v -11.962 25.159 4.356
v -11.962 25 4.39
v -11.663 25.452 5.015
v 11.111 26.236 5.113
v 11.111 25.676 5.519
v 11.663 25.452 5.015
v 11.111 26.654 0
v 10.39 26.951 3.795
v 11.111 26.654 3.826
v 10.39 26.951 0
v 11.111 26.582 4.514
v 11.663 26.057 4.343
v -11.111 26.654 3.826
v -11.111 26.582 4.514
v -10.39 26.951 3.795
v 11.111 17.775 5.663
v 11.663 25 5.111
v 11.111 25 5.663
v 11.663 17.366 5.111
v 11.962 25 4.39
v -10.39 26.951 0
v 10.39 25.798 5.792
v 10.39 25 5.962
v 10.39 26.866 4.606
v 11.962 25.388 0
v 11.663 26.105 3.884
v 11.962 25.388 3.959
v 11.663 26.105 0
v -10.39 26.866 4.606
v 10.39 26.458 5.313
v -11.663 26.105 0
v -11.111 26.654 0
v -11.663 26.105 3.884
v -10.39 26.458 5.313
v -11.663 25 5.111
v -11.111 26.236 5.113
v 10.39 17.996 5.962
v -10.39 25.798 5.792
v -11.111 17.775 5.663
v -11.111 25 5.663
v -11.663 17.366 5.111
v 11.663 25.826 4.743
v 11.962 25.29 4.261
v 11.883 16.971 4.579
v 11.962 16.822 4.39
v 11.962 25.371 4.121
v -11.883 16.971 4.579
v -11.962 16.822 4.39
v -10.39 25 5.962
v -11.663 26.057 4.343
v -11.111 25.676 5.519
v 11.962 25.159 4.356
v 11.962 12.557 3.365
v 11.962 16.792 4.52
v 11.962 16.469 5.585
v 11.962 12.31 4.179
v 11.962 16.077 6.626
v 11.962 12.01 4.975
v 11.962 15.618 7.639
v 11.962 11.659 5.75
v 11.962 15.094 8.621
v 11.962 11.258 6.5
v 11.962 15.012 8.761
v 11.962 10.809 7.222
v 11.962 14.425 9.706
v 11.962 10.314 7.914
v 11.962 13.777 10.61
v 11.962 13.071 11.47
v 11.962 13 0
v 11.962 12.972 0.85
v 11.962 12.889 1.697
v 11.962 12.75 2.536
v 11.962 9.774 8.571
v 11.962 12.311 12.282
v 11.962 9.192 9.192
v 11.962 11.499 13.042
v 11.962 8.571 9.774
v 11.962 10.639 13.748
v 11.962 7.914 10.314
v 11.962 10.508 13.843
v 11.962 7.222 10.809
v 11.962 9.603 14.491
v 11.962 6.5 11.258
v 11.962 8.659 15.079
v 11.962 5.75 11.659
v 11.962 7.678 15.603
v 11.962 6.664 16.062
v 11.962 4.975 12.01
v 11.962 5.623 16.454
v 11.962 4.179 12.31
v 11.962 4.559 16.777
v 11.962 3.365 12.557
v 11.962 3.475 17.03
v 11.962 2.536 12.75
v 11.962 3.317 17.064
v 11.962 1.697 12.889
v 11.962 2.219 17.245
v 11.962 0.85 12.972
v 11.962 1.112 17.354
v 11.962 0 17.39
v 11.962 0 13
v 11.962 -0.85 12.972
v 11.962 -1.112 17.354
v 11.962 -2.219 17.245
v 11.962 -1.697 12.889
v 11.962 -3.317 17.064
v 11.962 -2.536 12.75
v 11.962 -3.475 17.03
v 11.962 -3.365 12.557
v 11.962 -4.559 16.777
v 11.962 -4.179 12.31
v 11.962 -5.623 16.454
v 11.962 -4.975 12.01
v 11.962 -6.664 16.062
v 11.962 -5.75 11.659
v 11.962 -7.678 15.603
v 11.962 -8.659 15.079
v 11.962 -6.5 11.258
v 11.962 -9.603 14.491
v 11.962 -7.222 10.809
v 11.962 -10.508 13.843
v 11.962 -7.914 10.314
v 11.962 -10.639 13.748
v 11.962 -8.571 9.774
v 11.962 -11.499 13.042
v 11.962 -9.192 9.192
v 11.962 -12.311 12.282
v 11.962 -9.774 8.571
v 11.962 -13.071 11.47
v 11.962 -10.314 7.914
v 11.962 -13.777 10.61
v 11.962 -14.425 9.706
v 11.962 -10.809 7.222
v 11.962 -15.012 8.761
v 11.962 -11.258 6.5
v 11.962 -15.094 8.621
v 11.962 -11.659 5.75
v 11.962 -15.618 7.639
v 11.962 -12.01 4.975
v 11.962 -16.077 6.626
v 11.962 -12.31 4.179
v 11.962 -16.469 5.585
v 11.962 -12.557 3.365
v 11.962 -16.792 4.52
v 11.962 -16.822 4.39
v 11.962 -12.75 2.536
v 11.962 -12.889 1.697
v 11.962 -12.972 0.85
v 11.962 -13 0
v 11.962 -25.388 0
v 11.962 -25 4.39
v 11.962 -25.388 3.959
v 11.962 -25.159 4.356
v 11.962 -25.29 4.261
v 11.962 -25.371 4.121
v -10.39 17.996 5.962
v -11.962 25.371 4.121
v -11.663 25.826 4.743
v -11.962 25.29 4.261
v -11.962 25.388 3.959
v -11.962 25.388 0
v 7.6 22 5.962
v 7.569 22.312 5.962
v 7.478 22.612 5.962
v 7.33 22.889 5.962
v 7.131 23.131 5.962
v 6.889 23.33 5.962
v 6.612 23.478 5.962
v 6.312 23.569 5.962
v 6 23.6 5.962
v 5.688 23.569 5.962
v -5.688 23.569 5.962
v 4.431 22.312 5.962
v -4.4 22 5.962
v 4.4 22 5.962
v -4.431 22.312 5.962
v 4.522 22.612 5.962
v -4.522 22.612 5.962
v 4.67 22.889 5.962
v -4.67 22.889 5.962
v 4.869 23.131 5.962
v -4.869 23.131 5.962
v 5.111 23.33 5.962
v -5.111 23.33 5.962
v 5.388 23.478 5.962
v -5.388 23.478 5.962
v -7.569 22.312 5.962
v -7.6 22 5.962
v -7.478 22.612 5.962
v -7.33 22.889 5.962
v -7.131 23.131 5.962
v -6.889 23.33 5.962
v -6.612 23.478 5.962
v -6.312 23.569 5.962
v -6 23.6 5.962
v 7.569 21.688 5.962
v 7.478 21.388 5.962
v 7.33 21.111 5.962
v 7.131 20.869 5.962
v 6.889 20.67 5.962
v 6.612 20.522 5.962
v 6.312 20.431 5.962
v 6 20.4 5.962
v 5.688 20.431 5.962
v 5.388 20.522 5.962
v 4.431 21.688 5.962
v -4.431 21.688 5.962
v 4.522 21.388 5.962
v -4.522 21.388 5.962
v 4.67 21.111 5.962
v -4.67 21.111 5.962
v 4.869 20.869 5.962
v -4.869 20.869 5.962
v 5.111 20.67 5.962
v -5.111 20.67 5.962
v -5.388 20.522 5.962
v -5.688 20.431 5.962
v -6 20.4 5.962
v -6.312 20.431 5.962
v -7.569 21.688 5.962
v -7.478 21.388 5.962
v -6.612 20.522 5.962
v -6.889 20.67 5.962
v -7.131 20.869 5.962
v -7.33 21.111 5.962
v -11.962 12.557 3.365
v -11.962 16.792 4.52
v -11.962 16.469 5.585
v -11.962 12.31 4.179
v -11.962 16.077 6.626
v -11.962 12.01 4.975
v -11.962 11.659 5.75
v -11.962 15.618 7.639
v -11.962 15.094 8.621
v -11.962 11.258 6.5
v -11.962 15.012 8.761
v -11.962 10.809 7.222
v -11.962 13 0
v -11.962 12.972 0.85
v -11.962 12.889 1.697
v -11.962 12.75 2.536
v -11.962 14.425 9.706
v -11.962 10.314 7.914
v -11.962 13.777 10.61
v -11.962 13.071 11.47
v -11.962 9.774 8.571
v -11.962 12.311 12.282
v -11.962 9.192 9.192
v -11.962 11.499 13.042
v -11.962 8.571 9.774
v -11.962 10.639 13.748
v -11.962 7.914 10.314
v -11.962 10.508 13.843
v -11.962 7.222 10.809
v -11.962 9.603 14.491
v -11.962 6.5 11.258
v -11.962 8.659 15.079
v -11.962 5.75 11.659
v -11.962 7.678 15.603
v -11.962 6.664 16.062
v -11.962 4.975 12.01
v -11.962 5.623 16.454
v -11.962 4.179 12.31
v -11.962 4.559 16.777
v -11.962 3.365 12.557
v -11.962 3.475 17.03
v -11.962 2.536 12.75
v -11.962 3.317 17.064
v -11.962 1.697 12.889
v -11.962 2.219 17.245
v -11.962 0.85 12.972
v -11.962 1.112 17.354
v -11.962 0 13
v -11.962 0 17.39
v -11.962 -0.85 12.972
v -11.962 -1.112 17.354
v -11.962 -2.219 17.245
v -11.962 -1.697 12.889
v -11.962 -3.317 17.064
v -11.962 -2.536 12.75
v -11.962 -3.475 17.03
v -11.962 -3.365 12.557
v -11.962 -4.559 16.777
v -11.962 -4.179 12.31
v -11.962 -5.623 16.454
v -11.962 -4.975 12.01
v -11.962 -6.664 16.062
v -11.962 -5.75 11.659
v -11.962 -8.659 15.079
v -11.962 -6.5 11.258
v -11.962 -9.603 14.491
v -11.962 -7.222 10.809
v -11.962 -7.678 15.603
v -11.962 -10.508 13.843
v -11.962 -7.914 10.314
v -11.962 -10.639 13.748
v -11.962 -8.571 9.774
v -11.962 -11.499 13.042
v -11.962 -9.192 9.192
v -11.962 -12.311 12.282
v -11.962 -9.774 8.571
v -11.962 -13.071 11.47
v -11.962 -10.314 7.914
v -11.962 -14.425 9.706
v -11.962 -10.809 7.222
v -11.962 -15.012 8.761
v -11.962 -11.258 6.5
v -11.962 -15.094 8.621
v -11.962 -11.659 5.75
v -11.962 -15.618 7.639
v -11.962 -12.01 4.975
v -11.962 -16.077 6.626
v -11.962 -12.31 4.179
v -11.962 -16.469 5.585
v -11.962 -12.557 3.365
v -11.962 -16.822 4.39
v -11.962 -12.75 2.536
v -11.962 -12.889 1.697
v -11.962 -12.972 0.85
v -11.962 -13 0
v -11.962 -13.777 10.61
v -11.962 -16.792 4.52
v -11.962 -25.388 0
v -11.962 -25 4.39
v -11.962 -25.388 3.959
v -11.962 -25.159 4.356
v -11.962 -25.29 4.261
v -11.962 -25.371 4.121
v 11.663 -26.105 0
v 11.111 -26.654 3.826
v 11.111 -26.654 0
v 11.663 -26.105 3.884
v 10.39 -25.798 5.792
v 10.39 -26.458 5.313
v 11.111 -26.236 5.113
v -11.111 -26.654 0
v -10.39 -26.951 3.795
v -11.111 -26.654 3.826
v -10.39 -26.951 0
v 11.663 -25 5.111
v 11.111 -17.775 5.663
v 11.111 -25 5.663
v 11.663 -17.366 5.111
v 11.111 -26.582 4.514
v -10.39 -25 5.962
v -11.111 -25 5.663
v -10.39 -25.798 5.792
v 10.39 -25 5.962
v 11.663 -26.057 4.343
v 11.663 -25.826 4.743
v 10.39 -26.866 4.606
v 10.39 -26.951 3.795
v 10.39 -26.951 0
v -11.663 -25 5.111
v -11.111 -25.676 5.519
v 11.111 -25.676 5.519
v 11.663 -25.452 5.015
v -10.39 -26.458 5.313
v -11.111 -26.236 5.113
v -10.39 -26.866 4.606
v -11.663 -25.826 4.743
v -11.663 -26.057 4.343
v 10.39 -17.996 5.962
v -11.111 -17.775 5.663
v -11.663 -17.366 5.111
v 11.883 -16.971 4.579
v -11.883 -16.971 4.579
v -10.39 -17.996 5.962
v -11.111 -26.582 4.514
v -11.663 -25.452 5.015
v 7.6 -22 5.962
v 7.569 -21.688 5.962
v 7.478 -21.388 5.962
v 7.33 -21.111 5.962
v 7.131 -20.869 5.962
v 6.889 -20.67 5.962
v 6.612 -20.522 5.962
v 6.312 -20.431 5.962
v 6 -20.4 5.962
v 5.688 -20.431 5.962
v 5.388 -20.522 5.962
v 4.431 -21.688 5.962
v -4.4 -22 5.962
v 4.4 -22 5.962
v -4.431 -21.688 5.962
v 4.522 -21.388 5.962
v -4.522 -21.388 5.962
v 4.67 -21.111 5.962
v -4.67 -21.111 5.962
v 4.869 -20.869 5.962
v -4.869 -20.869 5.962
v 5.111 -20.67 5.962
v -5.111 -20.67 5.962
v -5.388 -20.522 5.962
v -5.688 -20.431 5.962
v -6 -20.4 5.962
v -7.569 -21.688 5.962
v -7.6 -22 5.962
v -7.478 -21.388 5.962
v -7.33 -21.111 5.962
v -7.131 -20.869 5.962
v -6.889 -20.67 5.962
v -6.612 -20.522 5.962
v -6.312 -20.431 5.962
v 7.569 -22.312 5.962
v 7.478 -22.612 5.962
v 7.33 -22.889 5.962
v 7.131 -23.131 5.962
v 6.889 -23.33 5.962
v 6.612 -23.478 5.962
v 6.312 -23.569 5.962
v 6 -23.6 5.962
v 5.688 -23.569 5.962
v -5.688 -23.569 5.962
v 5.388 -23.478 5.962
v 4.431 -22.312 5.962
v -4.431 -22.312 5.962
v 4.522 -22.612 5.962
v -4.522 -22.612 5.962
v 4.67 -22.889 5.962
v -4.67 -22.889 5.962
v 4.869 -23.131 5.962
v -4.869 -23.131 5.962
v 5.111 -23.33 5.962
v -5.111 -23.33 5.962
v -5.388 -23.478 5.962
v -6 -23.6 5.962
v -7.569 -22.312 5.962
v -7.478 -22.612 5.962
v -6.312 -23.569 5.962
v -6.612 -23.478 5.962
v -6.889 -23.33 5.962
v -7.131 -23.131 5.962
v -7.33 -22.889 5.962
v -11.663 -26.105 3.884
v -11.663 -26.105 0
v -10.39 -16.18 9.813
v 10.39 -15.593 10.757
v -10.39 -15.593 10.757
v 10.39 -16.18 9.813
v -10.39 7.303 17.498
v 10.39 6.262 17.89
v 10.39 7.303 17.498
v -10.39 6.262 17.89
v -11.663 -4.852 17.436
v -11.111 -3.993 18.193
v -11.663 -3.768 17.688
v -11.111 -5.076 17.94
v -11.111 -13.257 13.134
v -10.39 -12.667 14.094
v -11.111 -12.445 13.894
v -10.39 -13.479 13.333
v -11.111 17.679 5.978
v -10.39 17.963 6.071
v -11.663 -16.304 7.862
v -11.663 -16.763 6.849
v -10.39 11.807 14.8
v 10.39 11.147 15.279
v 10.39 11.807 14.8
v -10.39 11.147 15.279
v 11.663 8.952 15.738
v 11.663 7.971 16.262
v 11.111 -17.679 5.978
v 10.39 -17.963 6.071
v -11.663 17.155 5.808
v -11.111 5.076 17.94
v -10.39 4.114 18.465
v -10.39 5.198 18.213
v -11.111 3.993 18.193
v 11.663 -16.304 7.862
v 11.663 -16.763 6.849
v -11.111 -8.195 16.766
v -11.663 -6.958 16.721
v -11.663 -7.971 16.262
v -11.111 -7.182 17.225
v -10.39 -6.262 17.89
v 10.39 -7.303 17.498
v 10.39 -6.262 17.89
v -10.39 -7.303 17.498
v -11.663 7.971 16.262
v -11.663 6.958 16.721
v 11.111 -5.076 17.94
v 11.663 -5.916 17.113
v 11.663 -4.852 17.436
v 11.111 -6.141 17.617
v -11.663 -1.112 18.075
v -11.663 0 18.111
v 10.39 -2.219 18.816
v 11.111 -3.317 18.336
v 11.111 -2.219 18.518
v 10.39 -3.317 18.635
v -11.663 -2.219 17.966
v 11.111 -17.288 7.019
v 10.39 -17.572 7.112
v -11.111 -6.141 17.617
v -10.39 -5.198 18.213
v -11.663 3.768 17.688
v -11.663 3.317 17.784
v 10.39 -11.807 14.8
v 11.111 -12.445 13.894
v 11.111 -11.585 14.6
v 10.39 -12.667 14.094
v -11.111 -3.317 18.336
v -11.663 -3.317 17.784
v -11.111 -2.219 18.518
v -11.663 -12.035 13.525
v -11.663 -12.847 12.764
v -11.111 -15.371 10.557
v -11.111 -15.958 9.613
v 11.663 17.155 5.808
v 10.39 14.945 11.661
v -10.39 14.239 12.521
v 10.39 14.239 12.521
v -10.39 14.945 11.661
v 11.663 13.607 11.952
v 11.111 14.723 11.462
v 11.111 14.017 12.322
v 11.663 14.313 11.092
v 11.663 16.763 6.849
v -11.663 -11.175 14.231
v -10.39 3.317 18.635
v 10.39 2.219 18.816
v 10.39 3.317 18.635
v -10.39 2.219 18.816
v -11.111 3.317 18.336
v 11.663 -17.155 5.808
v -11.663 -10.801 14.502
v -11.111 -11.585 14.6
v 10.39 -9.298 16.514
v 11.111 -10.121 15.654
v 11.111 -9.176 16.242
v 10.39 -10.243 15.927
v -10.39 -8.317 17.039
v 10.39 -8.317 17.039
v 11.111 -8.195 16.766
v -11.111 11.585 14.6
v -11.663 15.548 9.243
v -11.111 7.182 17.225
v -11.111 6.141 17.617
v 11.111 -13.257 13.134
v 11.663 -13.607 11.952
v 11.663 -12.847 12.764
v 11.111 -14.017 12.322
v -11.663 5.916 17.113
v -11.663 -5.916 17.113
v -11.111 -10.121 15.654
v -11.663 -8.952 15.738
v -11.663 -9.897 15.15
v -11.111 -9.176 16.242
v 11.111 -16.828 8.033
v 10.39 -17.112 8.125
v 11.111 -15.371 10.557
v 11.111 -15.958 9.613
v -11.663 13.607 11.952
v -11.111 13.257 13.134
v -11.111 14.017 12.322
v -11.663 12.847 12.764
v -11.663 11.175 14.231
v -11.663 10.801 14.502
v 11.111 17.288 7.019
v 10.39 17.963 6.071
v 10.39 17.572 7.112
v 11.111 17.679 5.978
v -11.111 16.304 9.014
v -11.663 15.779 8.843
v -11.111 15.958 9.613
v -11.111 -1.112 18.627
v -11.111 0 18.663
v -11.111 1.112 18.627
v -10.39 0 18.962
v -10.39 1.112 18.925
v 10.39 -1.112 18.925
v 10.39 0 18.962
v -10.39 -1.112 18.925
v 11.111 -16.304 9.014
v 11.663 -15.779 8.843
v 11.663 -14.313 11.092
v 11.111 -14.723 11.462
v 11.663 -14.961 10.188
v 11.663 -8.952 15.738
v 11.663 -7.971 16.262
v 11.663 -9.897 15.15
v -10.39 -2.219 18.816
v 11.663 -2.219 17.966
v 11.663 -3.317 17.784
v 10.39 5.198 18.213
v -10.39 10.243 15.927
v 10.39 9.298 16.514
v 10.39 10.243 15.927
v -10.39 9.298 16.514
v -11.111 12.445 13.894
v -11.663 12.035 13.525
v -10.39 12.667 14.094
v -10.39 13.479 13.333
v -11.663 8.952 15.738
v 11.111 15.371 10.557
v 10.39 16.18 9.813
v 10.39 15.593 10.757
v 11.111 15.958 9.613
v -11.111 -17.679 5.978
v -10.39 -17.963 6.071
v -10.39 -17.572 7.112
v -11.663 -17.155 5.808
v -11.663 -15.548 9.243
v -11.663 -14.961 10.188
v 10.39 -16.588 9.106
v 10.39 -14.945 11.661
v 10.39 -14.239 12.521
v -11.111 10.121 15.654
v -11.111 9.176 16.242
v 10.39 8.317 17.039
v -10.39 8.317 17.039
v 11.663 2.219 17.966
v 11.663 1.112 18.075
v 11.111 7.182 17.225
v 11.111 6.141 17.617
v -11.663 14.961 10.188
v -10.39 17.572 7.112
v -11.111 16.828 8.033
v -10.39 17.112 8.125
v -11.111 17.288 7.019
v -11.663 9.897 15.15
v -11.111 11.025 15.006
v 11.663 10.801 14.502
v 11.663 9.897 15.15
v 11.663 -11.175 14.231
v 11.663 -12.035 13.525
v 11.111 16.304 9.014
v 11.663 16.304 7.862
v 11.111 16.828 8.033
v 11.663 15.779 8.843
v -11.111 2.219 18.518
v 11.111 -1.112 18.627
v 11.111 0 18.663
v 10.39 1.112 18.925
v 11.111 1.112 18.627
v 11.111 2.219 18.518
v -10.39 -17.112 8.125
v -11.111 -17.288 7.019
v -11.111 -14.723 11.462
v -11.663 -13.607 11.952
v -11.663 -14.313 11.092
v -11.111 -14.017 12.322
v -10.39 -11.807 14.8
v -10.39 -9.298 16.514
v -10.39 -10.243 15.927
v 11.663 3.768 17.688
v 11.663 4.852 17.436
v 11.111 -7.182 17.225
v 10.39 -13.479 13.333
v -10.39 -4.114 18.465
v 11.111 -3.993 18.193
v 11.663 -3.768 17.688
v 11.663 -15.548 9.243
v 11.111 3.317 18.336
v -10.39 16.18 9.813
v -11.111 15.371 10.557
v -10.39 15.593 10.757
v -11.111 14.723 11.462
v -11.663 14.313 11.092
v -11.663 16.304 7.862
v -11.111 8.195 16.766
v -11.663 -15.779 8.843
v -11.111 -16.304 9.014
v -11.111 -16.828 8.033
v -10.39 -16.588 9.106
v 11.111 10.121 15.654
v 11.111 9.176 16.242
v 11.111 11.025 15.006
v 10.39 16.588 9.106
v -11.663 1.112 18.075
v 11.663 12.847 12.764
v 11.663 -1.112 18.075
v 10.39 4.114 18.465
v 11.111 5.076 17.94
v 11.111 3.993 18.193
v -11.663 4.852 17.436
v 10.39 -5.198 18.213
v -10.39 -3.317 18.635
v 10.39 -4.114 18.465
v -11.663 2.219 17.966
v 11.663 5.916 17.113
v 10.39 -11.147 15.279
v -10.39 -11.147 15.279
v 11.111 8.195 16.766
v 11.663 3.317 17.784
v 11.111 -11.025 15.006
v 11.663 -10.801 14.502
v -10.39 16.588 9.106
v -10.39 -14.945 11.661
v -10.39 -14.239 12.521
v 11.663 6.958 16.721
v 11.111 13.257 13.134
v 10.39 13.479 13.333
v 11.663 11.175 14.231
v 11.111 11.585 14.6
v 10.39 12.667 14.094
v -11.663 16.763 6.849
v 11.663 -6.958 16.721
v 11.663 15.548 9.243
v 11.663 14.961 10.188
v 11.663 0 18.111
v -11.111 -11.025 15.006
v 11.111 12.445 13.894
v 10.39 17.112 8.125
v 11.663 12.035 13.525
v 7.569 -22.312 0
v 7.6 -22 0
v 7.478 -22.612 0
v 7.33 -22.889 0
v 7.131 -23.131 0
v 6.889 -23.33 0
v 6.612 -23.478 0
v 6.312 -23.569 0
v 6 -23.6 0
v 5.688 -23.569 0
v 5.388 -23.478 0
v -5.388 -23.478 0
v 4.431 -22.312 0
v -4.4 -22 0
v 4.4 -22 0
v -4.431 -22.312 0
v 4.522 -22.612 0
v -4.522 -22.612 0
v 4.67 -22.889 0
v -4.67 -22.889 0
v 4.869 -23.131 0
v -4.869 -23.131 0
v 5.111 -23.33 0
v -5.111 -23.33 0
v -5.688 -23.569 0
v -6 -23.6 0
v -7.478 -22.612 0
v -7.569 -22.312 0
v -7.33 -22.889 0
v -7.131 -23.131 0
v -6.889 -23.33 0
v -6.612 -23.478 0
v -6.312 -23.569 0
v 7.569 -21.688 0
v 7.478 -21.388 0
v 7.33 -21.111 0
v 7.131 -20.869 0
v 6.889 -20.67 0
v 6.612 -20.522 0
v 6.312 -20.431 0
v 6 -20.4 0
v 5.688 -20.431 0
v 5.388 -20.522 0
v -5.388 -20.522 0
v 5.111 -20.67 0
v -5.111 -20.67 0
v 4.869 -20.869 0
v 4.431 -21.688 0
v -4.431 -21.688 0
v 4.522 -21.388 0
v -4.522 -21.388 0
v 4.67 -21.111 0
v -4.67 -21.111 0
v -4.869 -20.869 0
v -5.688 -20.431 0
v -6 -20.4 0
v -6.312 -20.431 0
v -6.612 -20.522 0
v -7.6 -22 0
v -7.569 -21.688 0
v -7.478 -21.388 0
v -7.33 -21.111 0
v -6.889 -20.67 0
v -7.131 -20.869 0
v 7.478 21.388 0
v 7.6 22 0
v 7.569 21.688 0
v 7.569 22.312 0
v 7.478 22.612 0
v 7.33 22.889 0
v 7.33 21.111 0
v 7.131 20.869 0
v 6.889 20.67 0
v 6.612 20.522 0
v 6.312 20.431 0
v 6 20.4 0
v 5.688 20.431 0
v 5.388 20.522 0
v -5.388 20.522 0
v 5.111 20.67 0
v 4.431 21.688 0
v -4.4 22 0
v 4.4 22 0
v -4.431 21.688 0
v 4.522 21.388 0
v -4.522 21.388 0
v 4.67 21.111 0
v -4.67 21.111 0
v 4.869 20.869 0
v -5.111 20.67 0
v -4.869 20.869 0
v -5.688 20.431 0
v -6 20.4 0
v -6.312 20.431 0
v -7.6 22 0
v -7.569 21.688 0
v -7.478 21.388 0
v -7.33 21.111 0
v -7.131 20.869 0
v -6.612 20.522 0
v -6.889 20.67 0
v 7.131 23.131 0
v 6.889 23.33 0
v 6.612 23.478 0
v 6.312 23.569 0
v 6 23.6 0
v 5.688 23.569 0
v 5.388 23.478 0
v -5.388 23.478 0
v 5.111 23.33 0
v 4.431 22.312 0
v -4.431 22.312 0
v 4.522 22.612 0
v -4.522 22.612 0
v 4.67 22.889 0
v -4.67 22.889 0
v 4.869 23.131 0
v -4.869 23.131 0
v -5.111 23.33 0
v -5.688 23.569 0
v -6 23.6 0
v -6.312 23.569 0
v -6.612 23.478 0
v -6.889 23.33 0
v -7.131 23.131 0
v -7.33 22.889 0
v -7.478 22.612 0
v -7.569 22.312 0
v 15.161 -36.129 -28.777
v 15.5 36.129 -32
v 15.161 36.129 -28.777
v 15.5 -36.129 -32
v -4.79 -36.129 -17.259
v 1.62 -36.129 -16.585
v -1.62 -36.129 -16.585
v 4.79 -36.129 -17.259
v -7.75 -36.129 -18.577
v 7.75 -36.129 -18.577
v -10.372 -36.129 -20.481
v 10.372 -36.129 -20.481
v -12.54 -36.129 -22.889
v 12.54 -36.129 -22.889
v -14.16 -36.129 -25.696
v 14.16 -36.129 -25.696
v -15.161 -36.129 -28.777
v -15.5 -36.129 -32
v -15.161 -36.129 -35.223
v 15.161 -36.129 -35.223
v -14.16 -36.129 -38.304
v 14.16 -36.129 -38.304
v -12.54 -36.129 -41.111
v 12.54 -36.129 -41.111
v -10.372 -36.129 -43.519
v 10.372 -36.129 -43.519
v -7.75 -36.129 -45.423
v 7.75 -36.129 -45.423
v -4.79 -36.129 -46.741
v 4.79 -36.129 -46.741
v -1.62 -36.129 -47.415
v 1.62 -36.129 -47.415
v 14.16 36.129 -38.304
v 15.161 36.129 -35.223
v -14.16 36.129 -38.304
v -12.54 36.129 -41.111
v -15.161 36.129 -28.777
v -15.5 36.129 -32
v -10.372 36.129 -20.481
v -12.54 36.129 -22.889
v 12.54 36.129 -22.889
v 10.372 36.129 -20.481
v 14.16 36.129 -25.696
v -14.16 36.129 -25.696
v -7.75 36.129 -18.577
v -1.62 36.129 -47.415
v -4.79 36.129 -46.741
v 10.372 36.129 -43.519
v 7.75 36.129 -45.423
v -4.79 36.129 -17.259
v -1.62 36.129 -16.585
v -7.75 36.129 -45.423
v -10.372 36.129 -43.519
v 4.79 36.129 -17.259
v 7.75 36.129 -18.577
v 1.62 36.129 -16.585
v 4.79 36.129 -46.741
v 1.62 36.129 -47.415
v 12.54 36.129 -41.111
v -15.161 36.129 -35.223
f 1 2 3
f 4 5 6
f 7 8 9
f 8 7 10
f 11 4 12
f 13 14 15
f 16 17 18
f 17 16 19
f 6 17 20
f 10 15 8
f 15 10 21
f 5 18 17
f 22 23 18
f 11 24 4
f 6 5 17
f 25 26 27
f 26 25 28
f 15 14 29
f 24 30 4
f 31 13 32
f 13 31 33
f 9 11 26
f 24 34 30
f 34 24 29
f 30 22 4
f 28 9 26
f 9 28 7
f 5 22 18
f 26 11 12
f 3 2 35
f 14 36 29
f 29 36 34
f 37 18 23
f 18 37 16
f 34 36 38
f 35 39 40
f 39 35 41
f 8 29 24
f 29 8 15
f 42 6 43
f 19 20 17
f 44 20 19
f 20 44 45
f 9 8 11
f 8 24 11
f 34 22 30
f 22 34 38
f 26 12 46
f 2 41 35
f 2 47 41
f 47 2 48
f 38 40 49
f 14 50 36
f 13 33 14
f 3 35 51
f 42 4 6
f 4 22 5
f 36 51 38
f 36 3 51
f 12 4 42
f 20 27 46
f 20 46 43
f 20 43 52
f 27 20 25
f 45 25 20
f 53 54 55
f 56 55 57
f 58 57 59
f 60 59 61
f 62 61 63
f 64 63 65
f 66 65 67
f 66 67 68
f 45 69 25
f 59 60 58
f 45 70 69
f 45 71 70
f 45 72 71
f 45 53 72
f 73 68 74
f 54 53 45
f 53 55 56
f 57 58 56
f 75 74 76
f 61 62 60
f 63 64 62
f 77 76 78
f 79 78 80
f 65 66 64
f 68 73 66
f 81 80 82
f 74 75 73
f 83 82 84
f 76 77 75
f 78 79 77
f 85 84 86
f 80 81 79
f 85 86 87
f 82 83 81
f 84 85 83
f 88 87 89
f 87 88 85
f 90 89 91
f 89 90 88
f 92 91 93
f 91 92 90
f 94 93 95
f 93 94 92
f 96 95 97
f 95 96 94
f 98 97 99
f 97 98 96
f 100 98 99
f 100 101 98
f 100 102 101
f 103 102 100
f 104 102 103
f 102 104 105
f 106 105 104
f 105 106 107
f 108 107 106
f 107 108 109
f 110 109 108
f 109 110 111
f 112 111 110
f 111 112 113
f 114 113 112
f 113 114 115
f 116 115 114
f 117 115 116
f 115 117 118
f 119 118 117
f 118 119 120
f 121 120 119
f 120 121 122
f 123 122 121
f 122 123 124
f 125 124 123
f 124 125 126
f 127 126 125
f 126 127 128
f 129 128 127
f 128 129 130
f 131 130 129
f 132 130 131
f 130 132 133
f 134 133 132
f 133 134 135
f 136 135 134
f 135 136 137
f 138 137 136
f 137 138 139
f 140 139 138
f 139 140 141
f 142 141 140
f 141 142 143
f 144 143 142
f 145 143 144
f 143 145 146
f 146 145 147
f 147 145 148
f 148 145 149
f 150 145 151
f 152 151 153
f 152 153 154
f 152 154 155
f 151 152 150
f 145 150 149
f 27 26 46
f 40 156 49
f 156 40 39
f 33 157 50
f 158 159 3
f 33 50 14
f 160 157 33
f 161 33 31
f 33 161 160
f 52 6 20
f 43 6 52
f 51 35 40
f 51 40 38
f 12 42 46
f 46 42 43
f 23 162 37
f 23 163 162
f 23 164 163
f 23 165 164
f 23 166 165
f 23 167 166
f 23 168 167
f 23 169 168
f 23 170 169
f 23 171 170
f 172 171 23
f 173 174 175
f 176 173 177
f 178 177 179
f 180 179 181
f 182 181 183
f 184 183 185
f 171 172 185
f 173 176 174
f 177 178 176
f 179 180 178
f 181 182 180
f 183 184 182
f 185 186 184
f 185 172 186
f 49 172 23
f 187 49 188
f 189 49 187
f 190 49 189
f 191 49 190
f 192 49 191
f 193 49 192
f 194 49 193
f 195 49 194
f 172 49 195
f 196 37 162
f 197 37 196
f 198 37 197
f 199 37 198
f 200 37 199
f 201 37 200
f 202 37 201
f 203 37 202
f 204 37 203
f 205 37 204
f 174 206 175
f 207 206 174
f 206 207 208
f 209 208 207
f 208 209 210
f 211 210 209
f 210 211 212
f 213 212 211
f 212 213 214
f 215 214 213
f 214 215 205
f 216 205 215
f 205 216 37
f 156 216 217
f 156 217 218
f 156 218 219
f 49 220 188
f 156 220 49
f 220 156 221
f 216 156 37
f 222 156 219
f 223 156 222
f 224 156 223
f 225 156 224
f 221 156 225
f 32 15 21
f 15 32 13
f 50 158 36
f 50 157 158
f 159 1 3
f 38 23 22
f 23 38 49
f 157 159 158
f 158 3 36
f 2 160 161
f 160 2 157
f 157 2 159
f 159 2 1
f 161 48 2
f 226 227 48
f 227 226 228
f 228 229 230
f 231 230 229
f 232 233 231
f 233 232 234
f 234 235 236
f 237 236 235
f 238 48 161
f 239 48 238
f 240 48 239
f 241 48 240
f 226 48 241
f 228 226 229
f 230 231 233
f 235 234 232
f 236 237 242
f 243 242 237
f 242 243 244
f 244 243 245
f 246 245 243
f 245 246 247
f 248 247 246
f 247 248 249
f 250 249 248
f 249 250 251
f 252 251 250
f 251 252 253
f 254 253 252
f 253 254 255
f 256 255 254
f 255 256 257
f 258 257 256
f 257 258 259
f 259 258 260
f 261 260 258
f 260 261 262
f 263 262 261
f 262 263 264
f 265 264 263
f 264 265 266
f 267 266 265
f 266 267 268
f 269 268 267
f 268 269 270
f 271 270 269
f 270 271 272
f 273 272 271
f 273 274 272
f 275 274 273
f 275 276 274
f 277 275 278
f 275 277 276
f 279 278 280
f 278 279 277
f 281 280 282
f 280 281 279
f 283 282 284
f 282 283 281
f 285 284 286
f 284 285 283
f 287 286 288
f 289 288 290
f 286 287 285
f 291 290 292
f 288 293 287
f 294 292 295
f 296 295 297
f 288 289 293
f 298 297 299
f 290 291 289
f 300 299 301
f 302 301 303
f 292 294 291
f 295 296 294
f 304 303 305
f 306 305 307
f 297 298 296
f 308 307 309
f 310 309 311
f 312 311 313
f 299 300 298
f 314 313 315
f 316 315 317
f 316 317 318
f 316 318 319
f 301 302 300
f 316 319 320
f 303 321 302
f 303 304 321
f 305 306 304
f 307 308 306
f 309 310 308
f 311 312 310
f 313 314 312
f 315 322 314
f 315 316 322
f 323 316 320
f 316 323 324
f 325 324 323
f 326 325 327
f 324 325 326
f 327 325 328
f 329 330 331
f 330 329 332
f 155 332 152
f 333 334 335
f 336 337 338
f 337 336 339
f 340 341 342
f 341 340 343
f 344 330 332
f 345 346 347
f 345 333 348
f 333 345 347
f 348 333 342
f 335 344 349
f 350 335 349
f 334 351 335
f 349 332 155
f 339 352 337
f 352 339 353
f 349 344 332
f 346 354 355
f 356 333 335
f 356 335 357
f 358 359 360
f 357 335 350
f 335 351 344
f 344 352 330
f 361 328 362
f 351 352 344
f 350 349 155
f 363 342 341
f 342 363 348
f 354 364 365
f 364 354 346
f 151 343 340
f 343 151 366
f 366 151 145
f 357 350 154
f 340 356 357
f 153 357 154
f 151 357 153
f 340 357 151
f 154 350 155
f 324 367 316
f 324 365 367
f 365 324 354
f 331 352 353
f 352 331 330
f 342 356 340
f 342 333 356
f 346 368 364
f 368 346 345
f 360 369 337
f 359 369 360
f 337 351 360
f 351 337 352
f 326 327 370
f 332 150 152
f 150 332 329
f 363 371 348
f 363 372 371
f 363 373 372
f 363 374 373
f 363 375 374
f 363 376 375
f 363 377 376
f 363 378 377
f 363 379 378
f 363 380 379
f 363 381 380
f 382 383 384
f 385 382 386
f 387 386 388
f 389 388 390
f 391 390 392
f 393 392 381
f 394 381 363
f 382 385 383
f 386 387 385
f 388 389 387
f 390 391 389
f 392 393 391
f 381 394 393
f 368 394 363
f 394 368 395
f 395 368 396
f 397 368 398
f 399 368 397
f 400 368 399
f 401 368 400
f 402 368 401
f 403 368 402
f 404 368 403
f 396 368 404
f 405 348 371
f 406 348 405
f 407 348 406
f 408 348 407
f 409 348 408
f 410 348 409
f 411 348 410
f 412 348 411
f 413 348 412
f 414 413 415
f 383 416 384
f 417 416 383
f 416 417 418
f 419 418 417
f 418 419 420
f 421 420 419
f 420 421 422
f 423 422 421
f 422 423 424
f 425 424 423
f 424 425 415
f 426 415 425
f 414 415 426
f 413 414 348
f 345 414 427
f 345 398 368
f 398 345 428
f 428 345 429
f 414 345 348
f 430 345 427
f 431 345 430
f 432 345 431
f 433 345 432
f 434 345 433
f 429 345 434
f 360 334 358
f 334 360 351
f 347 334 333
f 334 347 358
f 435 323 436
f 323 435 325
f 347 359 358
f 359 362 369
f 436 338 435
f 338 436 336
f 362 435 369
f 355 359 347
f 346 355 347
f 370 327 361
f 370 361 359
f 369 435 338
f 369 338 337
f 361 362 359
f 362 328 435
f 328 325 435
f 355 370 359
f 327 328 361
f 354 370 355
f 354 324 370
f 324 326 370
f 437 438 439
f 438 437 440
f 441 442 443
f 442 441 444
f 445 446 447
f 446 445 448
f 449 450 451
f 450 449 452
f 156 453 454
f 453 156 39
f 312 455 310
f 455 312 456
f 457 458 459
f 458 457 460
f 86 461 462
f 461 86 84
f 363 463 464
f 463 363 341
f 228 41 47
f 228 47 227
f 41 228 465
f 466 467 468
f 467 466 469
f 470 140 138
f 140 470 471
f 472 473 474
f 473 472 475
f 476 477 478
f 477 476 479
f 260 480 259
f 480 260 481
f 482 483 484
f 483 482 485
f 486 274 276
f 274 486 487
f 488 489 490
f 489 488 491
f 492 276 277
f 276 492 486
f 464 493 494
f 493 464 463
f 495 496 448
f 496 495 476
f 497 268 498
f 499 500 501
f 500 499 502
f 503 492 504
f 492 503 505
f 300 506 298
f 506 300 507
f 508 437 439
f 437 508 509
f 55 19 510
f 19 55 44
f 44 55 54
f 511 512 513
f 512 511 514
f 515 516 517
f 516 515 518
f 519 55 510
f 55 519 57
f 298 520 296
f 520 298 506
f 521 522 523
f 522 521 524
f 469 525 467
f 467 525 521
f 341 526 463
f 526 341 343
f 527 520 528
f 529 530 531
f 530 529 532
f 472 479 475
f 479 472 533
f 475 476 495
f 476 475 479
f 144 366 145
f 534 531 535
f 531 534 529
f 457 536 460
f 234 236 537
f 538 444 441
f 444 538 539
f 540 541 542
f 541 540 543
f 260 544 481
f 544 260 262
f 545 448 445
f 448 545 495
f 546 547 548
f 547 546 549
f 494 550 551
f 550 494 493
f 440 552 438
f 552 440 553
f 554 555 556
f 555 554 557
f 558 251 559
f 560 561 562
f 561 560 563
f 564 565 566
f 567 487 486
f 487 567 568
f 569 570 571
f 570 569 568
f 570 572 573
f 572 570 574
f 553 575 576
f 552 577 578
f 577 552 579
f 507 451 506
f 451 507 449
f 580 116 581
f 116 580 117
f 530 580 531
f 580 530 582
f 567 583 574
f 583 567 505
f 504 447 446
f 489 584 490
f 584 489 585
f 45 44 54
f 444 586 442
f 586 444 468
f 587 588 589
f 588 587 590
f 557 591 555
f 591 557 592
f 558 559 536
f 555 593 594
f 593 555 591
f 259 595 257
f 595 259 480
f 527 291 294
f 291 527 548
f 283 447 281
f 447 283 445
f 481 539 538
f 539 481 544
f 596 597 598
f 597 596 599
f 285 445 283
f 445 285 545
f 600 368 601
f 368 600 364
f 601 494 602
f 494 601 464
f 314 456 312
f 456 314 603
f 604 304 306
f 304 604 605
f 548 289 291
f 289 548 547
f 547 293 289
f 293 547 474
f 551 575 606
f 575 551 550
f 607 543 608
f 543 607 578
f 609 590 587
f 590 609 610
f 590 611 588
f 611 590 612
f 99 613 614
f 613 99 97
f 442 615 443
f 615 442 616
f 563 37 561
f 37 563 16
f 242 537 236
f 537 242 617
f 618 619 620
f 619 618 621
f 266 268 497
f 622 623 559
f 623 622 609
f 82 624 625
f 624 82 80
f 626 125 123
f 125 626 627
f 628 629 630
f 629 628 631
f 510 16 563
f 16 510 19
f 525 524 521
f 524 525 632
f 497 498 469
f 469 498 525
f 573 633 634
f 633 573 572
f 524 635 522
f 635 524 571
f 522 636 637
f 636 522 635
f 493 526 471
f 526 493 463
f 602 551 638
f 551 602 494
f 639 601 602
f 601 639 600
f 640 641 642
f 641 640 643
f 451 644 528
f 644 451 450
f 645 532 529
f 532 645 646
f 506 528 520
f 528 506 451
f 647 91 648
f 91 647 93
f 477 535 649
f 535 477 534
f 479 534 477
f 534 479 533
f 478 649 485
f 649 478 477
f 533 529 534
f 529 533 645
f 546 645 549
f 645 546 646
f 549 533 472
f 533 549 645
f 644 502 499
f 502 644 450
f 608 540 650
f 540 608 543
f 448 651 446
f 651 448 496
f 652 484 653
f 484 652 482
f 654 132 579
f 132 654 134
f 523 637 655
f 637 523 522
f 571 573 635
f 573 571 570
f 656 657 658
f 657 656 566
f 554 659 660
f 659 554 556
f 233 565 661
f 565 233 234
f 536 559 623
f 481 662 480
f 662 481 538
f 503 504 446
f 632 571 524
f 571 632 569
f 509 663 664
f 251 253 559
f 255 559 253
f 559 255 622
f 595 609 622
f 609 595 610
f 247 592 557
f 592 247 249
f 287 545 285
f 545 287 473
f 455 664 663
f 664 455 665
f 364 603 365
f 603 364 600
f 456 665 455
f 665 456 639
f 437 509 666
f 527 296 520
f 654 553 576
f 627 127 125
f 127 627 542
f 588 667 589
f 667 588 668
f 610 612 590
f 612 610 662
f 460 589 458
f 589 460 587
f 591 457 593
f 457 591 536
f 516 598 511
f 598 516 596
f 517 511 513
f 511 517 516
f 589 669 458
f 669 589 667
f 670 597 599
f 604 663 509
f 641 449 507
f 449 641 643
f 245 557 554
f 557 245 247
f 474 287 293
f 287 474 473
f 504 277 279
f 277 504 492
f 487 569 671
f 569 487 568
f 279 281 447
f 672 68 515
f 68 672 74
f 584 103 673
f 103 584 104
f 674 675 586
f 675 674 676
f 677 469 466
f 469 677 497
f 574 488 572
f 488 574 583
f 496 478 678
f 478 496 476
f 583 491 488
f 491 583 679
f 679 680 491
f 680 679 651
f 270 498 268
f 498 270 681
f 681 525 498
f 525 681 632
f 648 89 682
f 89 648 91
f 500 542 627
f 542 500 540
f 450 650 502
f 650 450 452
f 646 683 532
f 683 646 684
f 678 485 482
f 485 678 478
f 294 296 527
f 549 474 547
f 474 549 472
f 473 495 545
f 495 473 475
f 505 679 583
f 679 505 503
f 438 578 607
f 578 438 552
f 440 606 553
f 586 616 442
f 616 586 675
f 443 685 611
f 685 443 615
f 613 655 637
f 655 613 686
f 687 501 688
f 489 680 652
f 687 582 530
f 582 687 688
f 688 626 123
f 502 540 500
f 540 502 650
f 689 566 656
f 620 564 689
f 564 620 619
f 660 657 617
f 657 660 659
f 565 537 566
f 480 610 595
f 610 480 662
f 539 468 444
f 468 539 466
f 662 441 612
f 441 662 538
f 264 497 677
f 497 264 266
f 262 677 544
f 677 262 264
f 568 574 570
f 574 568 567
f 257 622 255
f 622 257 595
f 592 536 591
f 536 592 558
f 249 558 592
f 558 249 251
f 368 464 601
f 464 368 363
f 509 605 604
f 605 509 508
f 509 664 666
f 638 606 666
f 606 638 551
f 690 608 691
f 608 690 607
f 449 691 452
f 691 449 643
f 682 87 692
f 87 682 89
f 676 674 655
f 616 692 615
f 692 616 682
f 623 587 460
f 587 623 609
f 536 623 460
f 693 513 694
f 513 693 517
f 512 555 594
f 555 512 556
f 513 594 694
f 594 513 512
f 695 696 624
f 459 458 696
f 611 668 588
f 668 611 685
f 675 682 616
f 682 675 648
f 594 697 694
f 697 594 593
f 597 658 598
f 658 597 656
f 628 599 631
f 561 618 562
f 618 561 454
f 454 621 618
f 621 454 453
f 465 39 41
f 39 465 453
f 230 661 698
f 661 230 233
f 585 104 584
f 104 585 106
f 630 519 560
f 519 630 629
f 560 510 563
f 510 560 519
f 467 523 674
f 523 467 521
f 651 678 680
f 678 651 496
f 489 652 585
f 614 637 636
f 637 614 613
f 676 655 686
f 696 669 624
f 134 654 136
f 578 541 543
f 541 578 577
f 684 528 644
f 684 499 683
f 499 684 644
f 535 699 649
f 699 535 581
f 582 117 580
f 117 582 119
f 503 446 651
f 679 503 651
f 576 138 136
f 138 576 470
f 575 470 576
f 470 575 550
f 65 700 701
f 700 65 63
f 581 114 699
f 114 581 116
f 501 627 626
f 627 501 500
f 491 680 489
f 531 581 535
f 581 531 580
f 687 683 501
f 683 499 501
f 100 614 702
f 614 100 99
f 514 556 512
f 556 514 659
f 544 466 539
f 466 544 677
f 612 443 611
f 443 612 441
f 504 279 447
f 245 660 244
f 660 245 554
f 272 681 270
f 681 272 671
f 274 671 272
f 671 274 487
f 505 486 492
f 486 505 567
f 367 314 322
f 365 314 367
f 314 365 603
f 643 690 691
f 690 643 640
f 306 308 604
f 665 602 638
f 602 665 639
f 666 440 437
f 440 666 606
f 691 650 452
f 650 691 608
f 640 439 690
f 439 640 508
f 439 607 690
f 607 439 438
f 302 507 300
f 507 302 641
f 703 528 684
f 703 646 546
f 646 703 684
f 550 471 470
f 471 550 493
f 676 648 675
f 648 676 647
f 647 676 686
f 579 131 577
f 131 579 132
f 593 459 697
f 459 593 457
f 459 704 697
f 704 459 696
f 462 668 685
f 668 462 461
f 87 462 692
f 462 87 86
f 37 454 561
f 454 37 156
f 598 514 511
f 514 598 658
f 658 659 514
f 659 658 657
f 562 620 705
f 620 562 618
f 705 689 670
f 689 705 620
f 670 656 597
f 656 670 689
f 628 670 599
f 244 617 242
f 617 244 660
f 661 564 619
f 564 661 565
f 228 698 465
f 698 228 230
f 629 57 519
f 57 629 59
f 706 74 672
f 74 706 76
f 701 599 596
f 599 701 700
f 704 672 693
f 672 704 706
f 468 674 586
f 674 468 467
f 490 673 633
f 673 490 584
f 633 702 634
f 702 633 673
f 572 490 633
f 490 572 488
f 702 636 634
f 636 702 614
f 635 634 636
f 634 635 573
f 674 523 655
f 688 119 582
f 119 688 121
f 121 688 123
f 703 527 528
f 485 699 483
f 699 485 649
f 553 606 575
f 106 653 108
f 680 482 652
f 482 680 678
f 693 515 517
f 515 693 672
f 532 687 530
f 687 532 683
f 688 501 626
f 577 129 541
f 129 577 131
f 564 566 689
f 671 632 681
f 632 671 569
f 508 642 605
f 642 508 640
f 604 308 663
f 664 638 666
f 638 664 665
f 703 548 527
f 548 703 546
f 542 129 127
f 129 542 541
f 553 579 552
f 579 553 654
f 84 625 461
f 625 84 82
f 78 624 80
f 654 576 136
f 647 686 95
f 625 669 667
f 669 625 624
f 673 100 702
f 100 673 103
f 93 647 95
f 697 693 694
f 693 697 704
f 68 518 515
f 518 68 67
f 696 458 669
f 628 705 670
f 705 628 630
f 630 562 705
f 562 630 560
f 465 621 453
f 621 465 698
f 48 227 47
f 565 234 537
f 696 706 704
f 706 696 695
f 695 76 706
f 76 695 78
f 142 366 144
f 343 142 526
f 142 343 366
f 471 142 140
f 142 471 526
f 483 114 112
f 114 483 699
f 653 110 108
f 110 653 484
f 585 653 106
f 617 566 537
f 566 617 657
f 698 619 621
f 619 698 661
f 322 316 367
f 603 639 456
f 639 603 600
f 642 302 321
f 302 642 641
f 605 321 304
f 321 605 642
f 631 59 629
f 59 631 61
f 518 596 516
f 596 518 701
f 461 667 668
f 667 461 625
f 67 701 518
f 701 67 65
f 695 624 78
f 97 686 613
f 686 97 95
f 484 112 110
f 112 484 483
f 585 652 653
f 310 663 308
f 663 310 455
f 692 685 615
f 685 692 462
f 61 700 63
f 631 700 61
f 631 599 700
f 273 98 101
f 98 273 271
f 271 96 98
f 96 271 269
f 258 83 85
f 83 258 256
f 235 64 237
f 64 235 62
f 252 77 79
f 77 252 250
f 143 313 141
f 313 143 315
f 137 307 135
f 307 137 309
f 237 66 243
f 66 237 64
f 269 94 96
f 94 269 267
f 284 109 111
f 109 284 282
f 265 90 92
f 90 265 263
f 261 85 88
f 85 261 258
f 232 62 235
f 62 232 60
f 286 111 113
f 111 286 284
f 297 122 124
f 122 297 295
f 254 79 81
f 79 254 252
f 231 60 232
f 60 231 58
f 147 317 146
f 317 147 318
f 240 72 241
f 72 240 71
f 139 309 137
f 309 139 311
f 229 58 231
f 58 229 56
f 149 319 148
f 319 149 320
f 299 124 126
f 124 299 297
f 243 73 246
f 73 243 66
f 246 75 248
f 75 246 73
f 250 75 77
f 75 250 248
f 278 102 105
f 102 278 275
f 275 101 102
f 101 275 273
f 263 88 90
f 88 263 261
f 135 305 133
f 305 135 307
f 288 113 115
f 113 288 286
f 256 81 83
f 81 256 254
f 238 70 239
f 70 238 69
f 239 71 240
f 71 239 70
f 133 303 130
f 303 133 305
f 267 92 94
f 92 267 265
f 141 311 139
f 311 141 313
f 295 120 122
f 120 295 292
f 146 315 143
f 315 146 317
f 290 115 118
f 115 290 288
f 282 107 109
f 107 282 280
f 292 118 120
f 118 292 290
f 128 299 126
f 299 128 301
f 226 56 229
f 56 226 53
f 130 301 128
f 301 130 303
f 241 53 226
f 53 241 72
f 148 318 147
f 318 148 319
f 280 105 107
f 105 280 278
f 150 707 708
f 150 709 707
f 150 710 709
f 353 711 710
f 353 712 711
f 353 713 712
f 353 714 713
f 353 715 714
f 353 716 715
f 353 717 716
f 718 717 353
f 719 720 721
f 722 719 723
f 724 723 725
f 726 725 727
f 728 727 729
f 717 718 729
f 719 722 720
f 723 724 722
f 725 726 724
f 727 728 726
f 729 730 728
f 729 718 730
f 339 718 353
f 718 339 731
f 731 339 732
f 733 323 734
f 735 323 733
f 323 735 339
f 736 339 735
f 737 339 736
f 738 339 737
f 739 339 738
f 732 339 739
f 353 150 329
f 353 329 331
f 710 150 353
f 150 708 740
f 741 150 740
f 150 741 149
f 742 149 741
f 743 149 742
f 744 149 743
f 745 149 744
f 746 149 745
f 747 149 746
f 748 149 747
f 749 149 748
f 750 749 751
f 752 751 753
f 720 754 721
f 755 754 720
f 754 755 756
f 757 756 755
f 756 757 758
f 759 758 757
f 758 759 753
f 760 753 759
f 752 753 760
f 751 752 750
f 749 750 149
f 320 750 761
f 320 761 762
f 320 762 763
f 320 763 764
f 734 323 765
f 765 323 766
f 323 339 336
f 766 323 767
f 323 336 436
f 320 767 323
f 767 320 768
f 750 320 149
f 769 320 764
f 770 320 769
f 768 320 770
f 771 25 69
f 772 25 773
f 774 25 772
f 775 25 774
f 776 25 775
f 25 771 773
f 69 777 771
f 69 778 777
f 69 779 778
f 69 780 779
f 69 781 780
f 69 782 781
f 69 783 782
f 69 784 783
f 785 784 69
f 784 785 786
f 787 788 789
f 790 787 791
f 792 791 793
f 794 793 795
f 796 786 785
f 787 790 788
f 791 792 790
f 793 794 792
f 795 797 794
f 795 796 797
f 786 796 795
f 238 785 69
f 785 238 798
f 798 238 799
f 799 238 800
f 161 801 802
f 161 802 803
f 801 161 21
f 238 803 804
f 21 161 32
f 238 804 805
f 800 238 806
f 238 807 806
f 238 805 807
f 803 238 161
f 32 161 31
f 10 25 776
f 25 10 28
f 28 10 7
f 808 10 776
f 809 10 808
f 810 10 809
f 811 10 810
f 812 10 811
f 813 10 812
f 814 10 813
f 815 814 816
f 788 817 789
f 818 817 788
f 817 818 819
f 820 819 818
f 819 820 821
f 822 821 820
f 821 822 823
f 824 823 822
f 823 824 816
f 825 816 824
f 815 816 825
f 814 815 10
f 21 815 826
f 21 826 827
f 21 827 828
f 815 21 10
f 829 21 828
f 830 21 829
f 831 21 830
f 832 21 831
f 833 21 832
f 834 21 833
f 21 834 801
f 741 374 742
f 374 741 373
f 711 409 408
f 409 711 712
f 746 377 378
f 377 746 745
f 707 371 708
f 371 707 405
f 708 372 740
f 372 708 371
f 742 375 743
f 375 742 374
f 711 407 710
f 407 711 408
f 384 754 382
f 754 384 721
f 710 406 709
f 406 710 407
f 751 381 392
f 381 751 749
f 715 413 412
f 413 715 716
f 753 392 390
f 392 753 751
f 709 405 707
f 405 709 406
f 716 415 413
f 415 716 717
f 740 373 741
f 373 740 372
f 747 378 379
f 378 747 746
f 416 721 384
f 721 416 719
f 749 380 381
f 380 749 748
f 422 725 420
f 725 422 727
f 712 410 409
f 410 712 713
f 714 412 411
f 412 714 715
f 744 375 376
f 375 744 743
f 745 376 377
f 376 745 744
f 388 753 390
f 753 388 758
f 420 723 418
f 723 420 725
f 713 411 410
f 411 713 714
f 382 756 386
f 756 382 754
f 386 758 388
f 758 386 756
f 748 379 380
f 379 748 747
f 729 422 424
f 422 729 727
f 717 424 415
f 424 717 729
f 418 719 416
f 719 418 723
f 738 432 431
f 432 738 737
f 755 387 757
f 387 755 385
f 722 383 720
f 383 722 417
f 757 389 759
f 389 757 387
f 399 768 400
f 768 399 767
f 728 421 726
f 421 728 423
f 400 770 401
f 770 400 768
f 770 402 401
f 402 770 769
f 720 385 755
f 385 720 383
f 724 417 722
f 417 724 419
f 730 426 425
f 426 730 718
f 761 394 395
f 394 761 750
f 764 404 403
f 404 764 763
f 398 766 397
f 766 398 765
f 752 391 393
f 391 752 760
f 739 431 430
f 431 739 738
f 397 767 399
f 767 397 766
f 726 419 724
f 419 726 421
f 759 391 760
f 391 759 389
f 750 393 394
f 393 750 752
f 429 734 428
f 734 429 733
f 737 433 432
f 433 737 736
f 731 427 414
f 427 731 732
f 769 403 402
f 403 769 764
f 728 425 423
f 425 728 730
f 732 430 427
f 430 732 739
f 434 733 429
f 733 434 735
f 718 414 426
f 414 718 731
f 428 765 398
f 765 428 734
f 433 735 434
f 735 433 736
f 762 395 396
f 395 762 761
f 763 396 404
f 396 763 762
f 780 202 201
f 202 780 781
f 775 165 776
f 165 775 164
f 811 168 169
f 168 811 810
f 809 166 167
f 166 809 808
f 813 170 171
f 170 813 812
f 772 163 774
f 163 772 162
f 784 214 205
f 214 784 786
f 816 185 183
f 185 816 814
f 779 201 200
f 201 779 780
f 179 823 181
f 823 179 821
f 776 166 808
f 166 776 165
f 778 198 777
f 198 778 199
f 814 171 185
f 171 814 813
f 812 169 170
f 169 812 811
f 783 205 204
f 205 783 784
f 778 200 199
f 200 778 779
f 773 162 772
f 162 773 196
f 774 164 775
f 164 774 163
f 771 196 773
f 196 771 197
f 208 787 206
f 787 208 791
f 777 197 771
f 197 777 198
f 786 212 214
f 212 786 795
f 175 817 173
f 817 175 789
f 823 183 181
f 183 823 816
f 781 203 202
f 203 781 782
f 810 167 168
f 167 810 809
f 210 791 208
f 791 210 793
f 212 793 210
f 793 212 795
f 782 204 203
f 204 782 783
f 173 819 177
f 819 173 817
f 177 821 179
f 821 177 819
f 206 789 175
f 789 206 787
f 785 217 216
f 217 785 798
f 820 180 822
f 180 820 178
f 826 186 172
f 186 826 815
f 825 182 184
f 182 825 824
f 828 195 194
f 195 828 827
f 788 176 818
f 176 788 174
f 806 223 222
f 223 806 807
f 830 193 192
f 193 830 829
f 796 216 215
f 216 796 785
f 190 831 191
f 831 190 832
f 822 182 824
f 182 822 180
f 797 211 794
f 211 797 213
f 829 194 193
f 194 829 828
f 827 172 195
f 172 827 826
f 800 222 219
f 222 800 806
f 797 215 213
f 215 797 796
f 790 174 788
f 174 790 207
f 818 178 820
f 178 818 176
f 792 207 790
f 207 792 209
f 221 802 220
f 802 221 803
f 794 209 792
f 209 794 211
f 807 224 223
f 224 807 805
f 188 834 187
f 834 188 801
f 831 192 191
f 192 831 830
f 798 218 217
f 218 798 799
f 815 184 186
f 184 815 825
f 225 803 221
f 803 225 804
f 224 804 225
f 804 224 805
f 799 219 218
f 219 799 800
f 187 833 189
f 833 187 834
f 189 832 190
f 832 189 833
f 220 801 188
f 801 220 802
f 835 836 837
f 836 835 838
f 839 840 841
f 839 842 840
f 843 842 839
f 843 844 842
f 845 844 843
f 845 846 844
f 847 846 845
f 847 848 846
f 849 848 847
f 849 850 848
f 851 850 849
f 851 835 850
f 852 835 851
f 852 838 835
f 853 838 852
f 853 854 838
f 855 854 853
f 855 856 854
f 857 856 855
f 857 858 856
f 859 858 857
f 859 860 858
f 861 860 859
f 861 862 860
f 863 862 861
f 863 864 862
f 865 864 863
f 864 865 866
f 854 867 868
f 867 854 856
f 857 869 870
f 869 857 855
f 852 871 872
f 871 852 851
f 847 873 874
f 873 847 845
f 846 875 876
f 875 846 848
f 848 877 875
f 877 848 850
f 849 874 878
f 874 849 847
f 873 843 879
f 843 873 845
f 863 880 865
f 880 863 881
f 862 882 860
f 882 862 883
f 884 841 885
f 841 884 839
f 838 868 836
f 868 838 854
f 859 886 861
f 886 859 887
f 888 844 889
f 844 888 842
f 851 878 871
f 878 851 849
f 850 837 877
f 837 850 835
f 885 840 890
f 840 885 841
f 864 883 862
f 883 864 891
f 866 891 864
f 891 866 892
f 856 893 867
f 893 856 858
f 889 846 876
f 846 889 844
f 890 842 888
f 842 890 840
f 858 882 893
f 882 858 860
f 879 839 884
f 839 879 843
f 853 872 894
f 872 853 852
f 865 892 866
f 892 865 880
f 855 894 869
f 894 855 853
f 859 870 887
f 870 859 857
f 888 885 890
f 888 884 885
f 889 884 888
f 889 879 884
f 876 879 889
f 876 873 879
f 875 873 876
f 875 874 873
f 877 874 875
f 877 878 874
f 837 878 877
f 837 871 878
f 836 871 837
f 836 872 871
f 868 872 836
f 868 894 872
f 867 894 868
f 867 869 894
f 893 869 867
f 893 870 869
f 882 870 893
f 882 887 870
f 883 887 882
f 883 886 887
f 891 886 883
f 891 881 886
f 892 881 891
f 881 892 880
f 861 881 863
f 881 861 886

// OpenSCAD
//25-26, 31-32

module upper()
{
	rotate([0, -90, 0])
	{
		difference()
		{
			intersection()
			{
				difference()
				{
					minkowski()
					{
						union()
						{
							cylinder(d=34, h=20, center=true, $fn=96);
							cube([8, 50, 20], center=true);
						}
						sphere(r=2, $fn=15);
					}
					cylinder(d=26, h=25, center=true, $fn=96);
				}
				translate([0, -35, -25]) cube([30, 70, 50]);
			}
			for (x=[-22, 22]) for (y=[-6, 6])
			{
				translate([-1, x, y]) rotate([0, 90, 0]) cylinder(d=3.2, h=10, $fn=32);
			}
		}
	}
}

module lower()
{
	rotate([0, -90, 0])
	{
		difference()
		{
			intersection()
			{
				difference()
				{
					minkowski()
					{
						union()
						{
							cylinder(d=34, h=20, center=true, $fn=96);
							cube([50, 50, 20], center=true);
						}
						sphere(r=2, $fn=15);
					}
					cylinder(d=26, h=25, center=true, $fn=96);
				}
				mirror([1, 0, 0]) translate([0, -35, -25]) cube([30, 70, 50]);
			}
			for (x=[-22, 22]) for (y=[-6, 6])
			{
				translate([1, x, y]) rotate([0, -90, 0]) cylinder(d=3.2, h=20, $fn=32);
				translate([-10, x, y]) rotate([0, -90, 0]) cylinder(d=6.5, h=20, $fn=32);
			}
			//translate([-28, -35, -15]) cube([10, 70, 30]);
			translate([-32, 0, 0]) rotate([90, 0, 0]) scale([1, 1, 32/31]) cylinder(d=31, h=70, center=true);
		}
	}
}

upper();
%lower();

translate([0, 0, -32]) rotate([90, 0, 0]) scale([1, 1, 32/31]) cylinder(d=31, h=70, center=true);
